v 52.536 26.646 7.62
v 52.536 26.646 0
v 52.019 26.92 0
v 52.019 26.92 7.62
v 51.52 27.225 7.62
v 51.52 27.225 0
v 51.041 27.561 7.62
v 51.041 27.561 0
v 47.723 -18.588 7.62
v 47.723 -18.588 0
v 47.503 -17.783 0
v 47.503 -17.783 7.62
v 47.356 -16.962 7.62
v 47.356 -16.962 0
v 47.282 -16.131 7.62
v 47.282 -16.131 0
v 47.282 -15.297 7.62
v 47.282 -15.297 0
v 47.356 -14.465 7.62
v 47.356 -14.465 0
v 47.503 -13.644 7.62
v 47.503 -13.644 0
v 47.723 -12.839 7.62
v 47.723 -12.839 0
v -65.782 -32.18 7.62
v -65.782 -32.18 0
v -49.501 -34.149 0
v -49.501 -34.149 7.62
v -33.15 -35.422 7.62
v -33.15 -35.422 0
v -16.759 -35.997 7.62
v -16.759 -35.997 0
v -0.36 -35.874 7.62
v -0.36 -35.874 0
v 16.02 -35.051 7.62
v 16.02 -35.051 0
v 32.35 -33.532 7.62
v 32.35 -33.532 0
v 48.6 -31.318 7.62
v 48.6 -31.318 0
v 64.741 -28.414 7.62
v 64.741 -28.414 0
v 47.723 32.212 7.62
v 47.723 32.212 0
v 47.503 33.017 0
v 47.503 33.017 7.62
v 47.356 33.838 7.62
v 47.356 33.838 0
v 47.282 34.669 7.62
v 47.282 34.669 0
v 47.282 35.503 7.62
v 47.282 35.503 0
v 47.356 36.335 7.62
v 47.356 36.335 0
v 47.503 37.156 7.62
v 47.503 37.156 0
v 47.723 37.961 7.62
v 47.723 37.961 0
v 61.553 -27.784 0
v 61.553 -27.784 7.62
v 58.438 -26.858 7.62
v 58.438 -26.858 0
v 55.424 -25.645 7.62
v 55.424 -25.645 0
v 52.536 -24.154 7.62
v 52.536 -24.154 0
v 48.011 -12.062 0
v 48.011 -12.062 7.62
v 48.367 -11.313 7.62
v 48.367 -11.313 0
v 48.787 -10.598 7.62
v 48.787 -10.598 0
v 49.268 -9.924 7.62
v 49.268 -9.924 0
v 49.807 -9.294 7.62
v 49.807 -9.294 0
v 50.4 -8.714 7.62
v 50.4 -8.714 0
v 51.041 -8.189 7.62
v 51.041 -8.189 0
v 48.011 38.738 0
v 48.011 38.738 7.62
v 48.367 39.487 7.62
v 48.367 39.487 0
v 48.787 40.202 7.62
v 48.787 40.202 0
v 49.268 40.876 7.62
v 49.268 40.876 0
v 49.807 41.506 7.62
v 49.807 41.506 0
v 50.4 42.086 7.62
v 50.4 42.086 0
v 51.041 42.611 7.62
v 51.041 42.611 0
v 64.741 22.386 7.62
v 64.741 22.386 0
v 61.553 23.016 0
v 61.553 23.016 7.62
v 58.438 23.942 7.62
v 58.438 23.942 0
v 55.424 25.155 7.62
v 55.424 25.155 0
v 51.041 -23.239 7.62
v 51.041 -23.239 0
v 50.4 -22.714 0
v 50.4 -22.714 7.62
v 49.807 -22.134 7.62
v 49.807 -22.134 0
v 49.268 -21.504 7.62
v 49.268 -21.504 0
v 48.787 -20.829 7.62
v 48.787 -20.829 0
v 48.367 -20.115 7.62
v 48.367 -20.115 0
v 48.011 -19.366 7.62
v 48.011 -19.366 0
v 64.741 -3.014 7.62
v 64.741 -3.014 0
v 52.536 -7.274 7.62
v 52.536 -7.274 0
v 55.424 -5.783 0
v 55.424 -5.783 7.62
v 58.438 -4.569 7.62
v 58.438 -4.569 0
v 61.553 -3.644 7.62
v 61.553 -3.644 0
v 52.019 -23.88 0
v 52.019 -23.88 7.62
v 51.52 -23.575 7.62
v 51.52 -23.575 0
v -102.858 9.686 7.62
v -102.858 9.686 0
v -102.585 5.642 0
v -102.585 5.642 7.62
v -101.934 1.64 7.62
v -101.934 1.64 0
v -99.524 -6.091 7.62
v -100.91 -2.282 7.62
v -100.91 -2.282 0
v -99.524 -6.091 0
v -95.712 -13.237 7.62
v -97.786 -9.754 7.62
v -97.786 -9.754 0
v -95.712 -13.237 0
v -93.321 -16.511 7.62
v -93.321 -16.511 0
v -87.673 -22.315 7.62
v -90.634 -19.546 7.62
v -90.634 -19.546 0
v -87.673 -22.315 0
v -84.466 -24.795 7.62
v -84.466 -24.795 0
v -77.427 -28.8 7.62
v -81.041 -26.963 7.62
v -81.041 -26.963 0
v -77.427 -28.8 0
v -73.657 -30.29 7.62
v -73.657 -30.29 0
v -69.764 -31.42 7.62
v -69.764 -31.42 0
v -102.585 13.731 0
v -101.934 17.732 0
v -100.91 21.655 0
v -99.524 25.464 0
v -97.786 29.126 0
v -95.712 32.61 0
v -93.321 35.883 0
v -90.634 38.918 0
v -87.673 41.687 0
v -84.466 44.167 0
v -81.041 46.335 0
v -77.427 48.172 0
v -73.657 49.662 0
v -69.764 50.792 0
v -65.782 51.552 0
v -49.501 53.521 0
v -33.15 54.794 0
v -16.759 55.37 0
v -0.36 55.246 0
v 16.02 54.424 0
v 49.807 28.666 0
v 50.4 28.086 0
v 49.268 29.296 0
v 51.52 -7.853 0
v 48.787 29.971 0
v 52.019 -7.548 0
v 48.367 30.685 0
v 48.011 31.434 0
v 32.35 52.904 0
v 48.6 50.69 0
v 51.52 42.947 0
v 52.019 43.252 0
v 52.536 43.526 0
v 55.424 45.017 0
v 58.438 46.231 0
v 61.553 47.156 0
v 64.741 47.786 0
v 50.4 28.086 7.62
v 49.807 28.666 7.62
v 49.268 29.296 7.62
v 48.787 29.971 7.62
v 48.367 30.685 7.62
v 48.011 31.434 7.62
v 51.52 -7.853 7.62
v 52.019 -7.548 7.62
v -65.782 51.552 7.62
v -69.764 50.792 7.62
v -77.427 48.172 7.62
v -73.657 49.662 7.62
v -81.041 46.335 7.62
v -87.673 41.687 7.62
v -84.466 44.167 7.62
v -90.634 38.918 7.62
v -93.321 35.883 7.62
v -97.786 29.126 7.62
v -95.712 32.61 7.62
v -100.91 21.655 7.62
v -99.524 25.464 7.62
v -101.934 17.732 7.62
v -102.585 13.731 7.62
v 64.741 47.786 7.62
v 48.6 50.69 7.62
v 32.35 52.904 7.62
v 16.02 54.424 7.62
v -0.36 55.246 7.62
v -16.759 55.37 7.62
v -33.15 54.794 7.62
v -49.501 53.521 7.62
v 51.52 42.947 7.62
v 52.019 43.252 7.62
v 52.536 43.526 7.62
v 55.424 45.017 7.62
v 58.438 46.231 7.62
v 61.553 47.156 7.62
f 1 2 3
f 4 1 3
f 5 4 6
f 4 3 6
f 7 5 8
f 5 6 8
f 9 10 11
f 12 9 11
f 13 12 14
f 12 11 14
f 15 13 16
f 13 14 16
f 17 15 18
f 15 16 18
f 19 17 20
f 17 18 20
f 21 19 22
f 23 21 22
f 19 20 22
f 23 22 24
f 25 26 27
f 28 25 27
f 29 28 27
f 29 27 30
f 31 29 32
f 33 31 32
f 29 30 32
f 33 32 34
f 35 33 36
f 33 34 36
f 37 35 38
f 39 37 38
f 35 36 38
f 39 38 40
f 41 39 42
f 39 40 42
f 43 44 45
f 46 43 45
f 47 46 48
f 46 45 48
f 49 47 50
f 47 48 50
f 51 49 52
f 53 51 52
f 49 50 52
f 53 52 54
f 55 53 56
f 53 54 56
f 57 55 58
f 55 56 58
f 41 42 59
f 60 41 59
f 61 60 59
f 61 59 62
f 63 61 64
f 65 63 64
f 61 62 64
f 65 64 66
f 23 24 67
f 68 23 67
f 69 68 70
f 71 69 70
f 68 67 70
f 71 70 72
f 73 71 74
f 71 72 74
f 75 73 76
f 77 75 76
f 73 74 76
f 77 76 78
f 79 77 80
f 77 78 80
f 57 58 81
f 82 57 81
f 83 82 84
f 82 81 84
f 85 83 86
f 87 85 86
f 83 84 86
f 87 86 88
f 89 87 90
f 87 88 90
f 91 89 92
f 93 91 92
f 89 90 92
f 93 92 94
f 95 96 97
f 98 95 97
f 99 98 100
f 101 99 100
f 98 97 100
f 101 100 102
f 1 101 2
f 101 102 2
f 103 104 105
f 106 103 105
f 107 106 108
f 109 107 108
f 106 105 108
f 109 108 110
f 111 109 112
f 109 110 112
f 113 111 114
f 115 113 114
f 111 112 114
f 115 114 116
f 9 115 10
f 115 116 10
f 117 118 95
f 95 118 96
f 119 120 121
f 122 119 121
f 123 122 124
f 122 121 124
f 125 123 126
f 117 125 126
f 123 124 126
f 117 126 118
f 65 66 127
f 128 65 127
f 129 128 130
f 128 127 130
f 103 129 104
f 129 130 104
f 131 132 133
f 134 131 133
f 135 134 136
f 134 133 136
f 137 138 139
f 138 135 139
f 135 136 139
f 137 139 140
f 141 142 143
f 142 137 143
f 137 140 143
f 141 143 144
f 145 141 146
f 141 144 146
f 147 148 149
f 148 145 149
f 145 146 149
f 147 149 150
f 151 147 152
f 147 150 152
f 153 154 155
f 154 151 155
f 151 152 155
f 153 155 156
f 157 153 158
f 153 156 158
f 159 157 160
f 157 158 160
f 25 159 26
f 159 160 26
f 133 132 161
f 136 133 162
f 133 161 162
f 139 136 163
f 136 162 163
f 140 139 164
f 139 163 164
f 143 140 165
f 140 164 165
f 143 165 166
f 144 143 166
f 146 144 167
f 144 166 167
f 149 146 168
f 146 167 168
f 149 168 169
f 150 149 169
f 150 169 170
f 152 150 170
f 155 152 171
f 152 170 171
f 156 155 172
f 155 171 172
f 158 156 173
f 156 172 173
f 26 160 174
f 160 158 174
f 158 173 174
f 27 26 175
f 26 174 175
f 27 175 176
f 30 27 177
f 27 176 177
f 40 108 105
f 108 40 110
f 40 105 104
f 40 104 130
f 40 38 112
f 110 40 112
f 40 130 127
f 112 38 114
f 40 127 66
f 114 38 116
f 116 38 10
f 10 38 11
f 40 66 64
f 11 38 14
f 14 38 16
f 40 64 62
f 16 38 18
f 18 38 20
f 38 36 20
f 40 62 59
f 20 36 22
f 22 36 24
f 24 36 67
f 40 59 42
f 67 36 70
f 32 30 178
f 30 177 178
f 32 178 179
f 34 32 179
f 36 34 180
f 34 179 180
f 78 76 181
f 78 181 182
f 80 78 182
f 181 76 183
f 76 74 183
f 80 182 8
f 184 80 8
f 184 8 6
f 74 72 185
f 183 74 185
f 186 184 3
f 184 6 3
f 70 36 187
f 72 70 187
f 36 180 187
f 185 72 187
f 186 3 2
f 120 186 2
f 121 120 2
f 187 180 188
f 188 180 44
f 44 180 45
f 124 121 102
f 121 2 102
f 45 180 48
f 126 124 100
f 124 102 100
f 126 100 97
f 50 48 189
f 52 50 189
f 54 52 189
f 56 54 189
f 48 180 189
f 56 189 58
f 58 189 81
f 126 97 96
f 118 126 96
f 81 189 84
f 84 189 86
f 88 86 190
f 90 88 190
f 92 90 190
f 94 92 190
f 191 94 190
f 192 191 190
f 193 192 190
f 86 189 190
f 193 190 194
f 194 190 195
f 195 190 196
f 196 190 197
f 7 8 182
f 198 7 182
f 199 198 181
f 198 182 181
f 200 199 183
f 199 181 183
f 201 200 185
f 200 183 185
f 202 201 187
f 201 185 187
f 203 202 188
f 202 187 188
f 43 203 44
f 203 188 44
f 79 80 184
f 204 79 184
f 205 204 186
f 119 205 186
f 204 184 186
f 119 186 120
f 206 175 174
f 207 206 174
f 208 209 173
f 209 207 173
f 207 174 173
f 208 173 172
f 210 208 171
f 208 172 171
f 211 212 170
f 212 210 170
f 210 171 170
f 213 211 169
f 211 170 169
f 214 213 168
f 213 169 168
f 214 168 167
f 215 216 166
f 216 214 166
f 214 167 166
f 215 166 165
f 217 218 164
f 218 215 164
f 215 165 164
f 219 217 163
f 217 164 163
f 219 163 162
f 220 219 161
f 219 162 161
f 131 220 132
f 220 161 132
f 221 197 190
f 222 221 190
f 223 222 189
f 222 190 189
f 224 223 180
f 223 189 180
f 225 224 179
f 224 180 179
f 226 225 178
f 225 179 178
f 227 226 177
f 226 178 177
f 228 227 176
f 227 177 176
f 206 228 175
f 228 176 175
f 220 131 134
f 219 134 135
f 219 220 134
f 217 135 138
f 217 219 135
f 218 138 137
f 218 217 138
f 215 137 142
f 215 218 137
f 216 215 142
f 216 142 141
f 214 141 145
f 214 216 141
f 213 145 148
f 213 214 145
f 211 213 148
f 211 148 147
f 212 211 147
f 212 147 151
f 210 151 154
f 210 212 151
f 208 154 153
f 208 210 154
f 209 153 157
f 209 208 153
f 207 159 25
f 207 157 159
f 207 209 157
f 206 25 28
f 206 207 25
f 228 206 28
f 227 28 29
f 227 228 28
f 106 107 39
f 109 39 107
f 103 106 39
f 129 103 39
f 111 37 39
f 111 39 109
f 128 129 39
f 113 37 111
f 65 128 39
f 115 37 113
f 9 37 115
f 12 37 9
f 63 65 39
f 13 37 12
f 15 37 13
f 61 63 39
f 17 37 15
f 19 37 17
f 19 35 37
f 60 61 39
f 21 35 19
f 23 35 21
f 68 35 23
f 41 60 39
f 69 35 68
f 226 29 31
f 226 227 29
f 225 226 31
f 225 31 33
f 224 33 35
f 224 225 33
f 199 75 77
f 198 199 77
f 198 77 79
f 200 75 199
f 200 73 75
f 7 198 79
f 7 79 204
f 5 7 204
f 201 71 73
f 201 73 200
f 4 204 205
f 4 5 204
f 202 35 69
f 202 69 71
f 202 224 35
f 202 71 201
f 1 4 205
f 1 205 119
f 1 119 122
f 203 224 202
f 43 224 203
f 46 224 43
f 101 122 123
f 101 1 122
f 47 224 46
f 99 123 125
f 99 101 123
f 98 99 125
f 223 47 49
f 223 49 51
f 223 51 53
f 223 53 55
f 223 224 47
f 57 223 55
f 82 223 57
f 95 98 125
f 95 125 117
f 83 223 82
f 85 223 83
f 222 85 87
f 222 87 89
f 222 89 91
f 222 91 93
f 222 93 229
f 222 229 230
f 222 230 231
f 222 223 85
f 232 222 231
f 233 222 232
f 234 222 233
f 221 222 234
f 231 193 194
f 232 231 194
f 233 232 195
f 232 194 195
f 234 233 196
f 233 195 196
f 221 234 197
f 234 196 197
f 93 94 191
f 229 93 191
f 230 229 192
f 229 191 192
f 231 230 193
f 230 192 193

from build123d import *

# Parameters (mm, degrees)
F1_DEPTH    = 7.62
F2_T1_DEPTH = 231.4037837241


# Not quite as in the source:
# - a fillet or chamfer that OpenCascade refuses, or shapes differently, is made with other operations: its cross-section is extruded or revolved along the edge and cut away or added


with BuildPart() as f1:
    # F0 (on Top) → F1 (new body)
    with BuildSketch(Plane.XY):
        with BuildLine():
            ThreePointArc((64.7411976721, 47.7861853946), (-11.4588023279, 55.4061853946), (-87.6588023279, 47.7861853946))
            Line((-87.6588023279, 47.7861853946), (64.7411976721, 47.7861853946))
        make_face()
        with BuildLine():
            Line((-87.6588023279, -28.4138146054), (-87.6588023279, 47.7861853946))
            ThreePointArc((-87.6588023279, 47.7861853946), (-102.8988023279, 9.6861853946), (-87.6588023279, -28.4138146054))
        make_face()
        with BuildLine():
            Line((64.7411976721, 47.7861853946), (-87.6588023279, 47.7861853946))
            Line((-87.6588023279, 47.7861853946), (-87.6588023279, -28.4138146054))
            Line((-87.6588023279, -28.4138146054), (64.7411976721, -28.4138146054))
            ThreePointArc((64.7411976721, -28.4138146054), (58.4381171141, -26.858273051), (52.536175044, -24.1535339048))
            ThreePointArc((52.536175044, -24.1535339048), (51.7671122609, -23.7311786415), (51.0407896557, -23.2389419038))
            ThreePointArc((51.0407896557, -23.2389419038), (46.5861857996, -19.8140652327), (42.744152416, -15.7138146054))
            ThreePointArc((42.744152416, -15.7138146054), (46.5861857996, -11.6135639782), (51.0407896557, -8.188687307))
            ThreePointArc((51.0407896557, -8.188687307), (51.7671122609, -7.6964505693), (52.536175044, -7.2740953061))
            ThreePointArc((52.536175044, -7.2740953061), (58.4381171141, -4.5693561598), (64.7411976721, -3.0138146054))
            Line((64.7411976721, -3.0138146054), (64.7411976721, 22.3861853946))
            ThreePointArc((64.7411976721, 22.3861853946), (58.4381171141, 23.941726949), (52.536175044, 26.6464660952))
            ThreePointArc((52.536175044, 26.6464660952), (51.7671122609, 27.0688213585), (51.0407896557, 27.5610580962))
            ThreePointArc((51.0407896557, 27.5610580962), (46.5861857996, 30.9859347673), (42.744152416, 35.0861853946))
            ThreePointArc((42.744152416, 35.0861853946), (46.5861857996, 39.1864360218), (51.0407896557, 42.611312693))
            ThreePointArc((51.0407896557, 42.611312693), (51.7671122609, 43.1035494307), (52.536175044, 43.5259046939))
            ThreePointArc((52.536175044, 43.5259046939), (58.4381171141, 46.2306438402), (64.7411976721, 47.7861853946))
        make_face()
        with BuildLine():
            Line((64.7411976721, -28.4138146054), (-87.6588023279, -28.4138146054))
            ThreePointArc((-87.6588023279, -28.4138146054), (-11.4588023279, -36.0338146054), (64.7411976721, -28.4138146054))
        make_face()
        with BuildLine():
            ThreePointArc((51.0407896557, -23.2389419038), (49.0199759717, -21.171856557), (47.7230187251, -18.5883644093))
            Line((47.7230187251, -18.5883644093), (42.744152416, -15.7138146054))
            ThreePointArc((42.744152416, -15.7138146054), (46.5861857996, -19.8140652327), (51.0407896557, -23.2389419038))
        make_face()
        with BuildLine():
            Line((42.744152416, -15.7138146054), (47.7230187251, -18.5883644093))
            ThreePointArc((47.7230187251, -18.5883644093), (47.2726087596, -15.7138146054), (47.7230187251, -12.8392648016))
            Line((47.7230187251, -12.8392648016), (42.744152416, -15.7138146054))
        make_face()
        with BuildLine():
            ThreePointArc((51.0407896557, -8.188687307), (46.5861857996, -11.6135639782), (42.744152416, -15.7138146054))
            Line((42.744152416, -15.7138146054), (47.7230187251, -12.8392648016))
            ThreePointArc((47.7230187251, -12.8392648016), (49.0199759717, -10.2557726539), (51.0407896557, -8.188687307))
        make_face()
        with BuildLine():
            Line((42.744152416, 35.0861853946), (47.7230187251, 37.9607351984))
            ThreePointArc((47.7230187251, 37.9607351984), (49.0199759717, 40.5442273461), (51.0407896557, 42.611312693))
            ThreePointArc((51.0407896557, 42.611312693), (46.5861857996, 39.1864360218), (42.744152416, 35.0861853946))
        make_face()
        with BuildLine():
            ThreePointArc((47.7230187251, 32.2116355907), (47.2726087596, 35.0861853946), (47.7230187251, 37.9607351984))
            Line((47.7230187251, 37.9607351984), (42.744152416, 35.0861853946))
            Line((42.744152416, 35.0861853946), (47.7230187251, 32.2116355907))
        make_face()
        with BuildLine():
            Line((47.7230187251, 32.2116355907), (42.744152416, 35.0861853946))
            ThreePointArc((42.744152416, 35.0861853946), (46.5861857996, 30.9859347673), (51.0407896557, 27.5610580962))
            ThreePointArc((51.0407896557, 27.5610580962), (49.0199759717, 29.628143443), (47.7230187251, 32.2116355907))
        make_face()
    extrude(amount=F1_DEPTH)

    # F2: fillet of radius 43.18 on 2 edges, made by hand

    # F2_s2 → F2_t1 (cut)
    with BuildSketch(Plane.XY.offset(-111.891891862)):
        with BuildLine():
            ThreePointArc((-102.7512263975, 13.7215151075), (-93.3157996924, -16.5173565237), (-65.7822764709, -32.1801063989))
            ThreePointArc((-65.7822764709, -32.1801063989), (-76.7477031003, -30.4547410024), (-87.6588023279, -28.4138146054))
            ThreePointArc((-87.6588023279, -28.4138146054), (-99.6630733138, -8.9429787444), (-102.7512263975, 13.7215151075))
        make_face()
        with BuildLine():
            ThreePointArc((-65.7822764709, 51.552477188), (-93.3157996924, 35.8897273129), (-102.7512263975, 5.6508556816))
            ThreePointArc((-102.7512263975, 5.6508556816), (-99.6630733138, 28.3153495335), (-87.6588023279, 47.7861853946))
            ThreePointArc((-87.6588023279, 47.7861853946), (-76.7477031003, 49.8271117916), (-65.7822764709, 51.552477188))
        make_face()
    extrude(amount=F2_T1_DEPTH, mode=Mode.SUBTRACT)


solid = f1.part
